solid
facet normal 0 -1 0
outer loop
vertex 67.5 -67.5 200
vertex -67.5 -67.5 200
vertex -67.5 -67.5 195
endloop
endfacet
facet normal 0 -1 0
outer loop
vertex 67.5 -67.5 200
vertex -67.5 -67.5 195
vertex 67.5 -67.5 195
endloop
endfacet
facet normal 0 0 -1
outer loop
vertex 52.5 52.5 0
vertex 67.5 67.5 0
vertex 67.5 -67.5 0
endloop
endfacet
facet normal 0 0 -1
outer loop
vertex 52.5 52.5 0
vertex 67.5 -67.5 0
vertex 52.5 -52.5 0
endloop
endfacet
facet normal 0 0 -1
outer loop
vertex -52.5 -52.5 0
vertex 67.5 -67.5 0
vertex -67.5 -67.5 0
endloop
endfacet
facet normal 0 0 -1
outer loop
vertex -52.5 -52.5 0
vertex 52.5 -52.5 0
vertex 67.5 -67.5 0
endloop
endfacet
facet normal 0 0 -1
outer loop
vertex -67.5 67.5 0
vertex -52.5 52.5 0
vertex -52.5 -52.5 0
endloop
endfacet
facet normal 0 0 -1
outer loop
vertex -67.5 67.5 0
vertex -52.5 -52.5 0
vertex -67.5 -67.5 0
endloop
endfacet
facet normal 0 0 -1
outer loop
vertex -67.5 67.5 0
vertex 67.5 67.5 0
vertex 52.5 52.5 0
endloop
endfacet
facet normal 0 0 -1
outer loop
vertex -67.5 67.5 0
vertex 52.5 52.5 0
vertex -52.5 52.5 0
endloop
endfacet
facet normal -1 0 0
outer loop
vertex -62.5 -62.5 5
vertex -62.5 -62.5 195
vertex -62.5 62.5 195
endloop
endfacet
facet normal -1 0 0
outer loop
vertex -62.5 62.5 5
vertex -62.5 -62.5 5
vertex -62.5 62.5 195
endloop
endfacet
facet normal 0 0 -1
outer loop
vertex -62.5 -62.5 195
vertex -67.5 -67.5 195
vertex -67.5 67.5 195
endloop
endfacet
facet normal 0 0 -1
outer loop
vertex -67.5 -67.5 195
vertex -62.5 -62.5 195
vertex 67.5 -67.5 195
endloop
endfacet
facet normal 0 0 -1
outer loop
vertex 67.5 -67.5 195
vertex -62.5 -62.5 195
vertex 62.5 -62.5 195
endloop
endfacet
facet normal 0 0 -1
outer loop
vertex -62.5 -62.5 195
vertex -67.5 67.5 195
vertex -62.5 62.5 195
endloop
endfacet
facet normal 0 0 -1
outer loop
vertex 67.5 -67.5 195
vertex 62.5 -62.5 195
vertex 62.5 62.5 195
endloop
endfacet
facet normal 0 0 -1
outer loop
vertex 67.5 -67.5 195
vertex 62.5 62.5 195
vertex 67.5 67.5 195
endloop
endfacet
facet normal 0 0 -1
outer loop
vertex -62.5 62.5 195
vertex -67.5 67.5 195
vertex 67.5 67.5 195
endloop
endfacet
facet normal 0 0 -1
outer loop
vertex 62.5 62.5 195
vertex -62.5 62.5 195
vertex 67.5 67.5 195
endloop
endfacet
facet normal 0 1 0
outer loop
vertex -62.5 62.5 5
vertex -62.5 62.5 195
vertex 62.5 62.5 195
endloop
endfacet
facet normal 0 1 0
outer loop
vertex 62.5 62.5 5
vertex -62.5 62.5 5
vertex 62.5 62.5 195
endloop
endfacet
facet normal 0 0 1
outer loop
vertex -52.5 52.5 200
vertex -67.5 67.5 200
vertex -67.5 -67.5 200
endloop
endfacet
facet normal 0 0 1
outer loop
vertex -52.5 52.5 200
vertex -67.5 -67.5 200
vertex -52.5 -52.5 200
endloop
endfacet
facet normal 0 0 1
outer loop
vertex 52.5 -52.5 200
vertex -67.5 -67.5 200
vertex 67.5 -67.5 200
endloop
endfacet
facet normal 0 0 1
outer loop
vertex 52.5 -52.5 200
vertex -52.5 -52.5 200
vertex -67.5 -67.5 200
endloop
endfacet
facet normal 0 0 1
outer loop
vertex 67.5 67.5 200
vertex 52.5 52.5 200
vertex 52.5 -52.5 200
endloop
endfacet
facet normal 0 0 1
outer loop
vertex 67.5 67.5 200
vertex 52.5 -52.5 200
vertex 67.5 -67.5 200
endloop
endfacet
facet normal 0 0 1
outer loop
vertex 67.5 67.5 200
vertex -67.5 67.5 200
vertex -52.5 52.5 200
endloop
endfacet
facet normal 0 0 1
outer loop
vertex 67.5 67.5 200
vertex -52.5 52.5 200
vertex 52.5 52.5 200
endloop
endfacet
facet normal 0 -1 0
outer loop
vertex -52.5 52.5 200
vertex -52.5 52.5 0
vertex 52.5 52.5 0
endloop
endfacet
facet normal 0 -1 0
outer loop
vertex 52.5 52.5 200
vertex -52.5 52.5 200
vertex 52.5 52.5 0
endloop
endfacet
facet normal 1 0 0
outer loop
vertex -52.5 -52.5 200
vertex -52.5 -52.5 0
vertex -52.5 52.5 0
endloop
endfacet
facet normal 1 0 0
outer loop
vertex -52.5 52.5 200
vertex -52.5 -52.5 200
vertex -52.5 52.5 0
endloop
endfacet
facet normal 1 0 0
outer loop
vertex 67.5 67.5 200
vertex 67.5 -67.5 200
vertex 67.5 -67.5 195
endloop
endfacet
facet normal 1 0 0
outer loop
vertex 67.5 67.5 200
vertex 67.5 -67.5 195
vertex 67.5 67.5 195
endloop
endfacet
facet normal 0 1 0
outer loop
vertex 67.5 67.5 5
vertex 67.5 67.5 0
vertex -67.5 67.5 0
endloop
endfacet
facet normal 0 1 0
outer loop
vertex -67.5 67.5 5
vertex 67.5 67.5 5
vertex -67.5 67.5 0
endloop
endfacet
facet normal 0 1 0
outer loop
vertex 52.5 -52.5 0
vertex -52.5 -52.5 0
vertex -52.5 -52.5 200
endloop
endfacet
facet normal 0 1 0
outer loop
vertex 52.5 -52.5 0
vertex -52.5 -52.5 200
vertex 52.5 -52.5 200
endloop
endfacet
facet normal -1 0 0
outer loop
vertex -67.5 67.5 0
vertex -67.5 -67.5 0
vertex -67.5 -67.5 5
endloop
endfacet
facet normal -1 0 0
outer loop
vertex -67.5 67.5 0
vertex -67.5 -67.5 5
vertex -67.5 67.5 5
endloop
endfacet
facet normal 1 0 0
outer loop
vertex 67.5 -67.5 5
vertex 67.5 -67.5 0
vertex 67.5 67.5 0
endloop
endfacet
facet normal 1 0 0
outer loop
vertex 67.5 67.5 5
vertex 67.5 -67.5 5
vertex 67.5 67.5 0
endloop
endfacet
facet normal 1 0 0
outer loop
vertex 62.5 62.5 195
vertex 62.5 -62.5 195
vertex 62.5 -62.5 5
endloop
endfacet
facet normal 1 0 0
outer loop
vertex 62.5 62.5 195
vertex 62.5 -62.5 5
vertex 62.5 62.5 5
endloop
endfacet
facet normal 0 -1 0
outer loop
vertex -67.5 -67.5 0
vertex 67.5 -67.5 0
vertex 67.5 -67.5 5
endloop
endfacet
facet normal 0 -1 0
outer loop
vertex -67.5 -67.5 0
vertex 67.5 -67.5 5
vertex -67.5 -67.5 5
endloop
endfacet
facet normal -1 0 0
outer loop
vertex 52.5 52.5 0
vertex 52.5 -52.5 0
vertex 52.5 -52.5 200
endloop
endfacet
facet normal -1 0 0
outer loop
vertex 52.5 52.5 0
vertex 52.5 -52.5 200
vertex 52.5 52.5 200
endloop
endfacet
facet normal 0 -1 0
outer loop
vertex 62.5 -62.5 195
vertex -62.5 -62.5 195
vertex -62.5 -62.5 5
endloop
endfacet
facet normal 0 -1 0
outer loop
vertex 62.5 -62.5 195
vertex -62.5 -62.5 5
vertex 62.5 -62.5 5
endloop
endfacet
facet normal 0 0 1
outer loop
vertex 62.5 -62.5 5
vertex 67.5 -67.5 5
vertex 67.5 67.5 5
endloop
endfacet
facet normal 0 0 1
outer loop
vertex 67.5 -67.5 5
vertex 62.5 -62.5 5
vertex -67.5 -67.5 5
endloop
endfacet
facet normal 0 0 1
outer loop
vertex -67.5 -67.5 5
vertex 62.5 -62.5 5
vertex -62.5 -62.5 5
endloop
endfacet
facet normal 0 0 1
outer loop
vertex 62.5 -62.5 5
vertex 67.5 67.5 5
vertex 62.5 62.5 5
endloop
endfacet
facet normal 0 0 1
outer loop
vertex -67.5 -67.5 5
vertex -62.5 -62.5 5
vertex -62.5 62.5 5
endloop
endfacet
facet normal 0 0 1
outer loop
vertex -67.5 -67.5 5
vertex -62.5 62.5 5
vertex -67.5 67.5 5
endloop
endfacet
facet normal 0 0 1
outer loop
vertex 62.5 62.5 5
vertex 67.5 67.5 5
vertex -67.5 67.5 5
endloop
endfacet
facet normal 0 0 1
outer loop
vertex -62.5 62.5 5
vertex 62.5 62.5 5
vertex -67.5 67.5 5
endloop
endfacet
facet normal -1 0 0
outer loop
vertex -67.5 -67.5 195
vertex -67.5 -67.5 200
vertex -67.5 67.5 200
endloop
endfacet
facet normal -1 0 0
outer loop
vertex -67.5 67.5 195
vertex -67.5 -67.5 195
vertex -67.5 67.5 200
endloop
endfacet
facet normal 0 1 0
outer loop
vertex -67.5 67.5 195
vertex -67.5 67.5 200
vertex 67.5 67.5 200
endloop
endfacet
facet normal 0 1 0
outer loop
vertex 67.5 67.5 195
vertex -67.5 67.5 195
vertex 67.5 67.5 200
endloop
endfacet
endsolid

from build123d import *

# Parameters (mm, degrees)
SKETCH1_W           = 125
SKETCH1_H           = 125
BOSS_EXTRUDE1_DEPTH = 200
SHELL1_T            = -10
SKETCH2_W           = 135
SKETCH2_H           = 135
SKETCH2_W_2         = 125
SKETCH2_H_2         = 125
SKETCH2_W_3         = 105
SKETCH2_H_3         = 105
BOSS_EXTRUDE2_DEPTH = 5
SKETCH3_W           = 135
SKETCH3_H           = 135
SKETCH3_W_2         = 125
SKETCH3_H_2         = 125
SKETCH3_W_3         = 105
SKETCH3_H_3         = 105
BOSS_EXTRUDE3_DEPTH = 5


with BuildPart() as part:
    # Sketch1 → Boss-Extrude1 (new body)
    with BuildSketch(Plane.XY):
        Rectangle(SKETCH1_W, SKETCH1_H)
    extrude(amount=BOSS_EXTRUDE1_DEPTH)

    # Shell1
    shell1_openings = [part.faces().sort_by_distance(p)[0] for p in [
        (0, 0, 200),
        (0, 0, 0),
    ]]
    offset(amount=SHELL1_T, openings=shell1_openings, kind=Kind.INTERSECTION)

    # Sketch2 → Boss-Extrude2 (add)
    # profile 1 of 2: a face of its own
    with BuildSketch(Plane.XY.offset(200)):
        Rectangle(SKETCH2_W, SKETCH2_H)
        Rectangle(SKETCH2_W_2, SKETCH2_H_2, mode=Mode.SUBTRACT)
    # profile 2 of 2: a face of its own
    with BuildSketch(Plane.XY.offset(200)):
        Rectangle(SKETCH2_W_2, SKETCH2_H_2)
        Rectangle(SKETCH2_W_3, SKETCH2_H_3, mode=Mode.SUBTRACT)
    extrude(amount=-BOSS_EXTRUDE2_DEPTH)

    # Sketch3 → Boss-Extrude3 (add)
    # profile 1 of 2: a face of its own
    with BuildSketch(Plane(origin=(0, 0, 0), x_dir=(-1, 0, 0), z_dir=(0, 0, -1))):
        Rectangle(SKETCH3_W, SKETCH3_H)
        Rectangle(SKETCH3_W_2, SKETCH3_H_2, mode=Mode.SUBTRACT)
    # profile 2 of 2: a face of its own
    with BuildSketch(Plane(origin=(0, 0, 0), x_dir=(-1, 0, 0), z_dir=(0, 0, -1))):
        Rectangle(SKETCH3_W_2, SKETCH3_H_2)
        Rectangle(SKETCH3_W_3, SKETCH3_H_3, mode=Mode.SUBTRACT)
    extrude(amount=-BOSS_EXTRUDE3_DEPTH)


solid = part.part
